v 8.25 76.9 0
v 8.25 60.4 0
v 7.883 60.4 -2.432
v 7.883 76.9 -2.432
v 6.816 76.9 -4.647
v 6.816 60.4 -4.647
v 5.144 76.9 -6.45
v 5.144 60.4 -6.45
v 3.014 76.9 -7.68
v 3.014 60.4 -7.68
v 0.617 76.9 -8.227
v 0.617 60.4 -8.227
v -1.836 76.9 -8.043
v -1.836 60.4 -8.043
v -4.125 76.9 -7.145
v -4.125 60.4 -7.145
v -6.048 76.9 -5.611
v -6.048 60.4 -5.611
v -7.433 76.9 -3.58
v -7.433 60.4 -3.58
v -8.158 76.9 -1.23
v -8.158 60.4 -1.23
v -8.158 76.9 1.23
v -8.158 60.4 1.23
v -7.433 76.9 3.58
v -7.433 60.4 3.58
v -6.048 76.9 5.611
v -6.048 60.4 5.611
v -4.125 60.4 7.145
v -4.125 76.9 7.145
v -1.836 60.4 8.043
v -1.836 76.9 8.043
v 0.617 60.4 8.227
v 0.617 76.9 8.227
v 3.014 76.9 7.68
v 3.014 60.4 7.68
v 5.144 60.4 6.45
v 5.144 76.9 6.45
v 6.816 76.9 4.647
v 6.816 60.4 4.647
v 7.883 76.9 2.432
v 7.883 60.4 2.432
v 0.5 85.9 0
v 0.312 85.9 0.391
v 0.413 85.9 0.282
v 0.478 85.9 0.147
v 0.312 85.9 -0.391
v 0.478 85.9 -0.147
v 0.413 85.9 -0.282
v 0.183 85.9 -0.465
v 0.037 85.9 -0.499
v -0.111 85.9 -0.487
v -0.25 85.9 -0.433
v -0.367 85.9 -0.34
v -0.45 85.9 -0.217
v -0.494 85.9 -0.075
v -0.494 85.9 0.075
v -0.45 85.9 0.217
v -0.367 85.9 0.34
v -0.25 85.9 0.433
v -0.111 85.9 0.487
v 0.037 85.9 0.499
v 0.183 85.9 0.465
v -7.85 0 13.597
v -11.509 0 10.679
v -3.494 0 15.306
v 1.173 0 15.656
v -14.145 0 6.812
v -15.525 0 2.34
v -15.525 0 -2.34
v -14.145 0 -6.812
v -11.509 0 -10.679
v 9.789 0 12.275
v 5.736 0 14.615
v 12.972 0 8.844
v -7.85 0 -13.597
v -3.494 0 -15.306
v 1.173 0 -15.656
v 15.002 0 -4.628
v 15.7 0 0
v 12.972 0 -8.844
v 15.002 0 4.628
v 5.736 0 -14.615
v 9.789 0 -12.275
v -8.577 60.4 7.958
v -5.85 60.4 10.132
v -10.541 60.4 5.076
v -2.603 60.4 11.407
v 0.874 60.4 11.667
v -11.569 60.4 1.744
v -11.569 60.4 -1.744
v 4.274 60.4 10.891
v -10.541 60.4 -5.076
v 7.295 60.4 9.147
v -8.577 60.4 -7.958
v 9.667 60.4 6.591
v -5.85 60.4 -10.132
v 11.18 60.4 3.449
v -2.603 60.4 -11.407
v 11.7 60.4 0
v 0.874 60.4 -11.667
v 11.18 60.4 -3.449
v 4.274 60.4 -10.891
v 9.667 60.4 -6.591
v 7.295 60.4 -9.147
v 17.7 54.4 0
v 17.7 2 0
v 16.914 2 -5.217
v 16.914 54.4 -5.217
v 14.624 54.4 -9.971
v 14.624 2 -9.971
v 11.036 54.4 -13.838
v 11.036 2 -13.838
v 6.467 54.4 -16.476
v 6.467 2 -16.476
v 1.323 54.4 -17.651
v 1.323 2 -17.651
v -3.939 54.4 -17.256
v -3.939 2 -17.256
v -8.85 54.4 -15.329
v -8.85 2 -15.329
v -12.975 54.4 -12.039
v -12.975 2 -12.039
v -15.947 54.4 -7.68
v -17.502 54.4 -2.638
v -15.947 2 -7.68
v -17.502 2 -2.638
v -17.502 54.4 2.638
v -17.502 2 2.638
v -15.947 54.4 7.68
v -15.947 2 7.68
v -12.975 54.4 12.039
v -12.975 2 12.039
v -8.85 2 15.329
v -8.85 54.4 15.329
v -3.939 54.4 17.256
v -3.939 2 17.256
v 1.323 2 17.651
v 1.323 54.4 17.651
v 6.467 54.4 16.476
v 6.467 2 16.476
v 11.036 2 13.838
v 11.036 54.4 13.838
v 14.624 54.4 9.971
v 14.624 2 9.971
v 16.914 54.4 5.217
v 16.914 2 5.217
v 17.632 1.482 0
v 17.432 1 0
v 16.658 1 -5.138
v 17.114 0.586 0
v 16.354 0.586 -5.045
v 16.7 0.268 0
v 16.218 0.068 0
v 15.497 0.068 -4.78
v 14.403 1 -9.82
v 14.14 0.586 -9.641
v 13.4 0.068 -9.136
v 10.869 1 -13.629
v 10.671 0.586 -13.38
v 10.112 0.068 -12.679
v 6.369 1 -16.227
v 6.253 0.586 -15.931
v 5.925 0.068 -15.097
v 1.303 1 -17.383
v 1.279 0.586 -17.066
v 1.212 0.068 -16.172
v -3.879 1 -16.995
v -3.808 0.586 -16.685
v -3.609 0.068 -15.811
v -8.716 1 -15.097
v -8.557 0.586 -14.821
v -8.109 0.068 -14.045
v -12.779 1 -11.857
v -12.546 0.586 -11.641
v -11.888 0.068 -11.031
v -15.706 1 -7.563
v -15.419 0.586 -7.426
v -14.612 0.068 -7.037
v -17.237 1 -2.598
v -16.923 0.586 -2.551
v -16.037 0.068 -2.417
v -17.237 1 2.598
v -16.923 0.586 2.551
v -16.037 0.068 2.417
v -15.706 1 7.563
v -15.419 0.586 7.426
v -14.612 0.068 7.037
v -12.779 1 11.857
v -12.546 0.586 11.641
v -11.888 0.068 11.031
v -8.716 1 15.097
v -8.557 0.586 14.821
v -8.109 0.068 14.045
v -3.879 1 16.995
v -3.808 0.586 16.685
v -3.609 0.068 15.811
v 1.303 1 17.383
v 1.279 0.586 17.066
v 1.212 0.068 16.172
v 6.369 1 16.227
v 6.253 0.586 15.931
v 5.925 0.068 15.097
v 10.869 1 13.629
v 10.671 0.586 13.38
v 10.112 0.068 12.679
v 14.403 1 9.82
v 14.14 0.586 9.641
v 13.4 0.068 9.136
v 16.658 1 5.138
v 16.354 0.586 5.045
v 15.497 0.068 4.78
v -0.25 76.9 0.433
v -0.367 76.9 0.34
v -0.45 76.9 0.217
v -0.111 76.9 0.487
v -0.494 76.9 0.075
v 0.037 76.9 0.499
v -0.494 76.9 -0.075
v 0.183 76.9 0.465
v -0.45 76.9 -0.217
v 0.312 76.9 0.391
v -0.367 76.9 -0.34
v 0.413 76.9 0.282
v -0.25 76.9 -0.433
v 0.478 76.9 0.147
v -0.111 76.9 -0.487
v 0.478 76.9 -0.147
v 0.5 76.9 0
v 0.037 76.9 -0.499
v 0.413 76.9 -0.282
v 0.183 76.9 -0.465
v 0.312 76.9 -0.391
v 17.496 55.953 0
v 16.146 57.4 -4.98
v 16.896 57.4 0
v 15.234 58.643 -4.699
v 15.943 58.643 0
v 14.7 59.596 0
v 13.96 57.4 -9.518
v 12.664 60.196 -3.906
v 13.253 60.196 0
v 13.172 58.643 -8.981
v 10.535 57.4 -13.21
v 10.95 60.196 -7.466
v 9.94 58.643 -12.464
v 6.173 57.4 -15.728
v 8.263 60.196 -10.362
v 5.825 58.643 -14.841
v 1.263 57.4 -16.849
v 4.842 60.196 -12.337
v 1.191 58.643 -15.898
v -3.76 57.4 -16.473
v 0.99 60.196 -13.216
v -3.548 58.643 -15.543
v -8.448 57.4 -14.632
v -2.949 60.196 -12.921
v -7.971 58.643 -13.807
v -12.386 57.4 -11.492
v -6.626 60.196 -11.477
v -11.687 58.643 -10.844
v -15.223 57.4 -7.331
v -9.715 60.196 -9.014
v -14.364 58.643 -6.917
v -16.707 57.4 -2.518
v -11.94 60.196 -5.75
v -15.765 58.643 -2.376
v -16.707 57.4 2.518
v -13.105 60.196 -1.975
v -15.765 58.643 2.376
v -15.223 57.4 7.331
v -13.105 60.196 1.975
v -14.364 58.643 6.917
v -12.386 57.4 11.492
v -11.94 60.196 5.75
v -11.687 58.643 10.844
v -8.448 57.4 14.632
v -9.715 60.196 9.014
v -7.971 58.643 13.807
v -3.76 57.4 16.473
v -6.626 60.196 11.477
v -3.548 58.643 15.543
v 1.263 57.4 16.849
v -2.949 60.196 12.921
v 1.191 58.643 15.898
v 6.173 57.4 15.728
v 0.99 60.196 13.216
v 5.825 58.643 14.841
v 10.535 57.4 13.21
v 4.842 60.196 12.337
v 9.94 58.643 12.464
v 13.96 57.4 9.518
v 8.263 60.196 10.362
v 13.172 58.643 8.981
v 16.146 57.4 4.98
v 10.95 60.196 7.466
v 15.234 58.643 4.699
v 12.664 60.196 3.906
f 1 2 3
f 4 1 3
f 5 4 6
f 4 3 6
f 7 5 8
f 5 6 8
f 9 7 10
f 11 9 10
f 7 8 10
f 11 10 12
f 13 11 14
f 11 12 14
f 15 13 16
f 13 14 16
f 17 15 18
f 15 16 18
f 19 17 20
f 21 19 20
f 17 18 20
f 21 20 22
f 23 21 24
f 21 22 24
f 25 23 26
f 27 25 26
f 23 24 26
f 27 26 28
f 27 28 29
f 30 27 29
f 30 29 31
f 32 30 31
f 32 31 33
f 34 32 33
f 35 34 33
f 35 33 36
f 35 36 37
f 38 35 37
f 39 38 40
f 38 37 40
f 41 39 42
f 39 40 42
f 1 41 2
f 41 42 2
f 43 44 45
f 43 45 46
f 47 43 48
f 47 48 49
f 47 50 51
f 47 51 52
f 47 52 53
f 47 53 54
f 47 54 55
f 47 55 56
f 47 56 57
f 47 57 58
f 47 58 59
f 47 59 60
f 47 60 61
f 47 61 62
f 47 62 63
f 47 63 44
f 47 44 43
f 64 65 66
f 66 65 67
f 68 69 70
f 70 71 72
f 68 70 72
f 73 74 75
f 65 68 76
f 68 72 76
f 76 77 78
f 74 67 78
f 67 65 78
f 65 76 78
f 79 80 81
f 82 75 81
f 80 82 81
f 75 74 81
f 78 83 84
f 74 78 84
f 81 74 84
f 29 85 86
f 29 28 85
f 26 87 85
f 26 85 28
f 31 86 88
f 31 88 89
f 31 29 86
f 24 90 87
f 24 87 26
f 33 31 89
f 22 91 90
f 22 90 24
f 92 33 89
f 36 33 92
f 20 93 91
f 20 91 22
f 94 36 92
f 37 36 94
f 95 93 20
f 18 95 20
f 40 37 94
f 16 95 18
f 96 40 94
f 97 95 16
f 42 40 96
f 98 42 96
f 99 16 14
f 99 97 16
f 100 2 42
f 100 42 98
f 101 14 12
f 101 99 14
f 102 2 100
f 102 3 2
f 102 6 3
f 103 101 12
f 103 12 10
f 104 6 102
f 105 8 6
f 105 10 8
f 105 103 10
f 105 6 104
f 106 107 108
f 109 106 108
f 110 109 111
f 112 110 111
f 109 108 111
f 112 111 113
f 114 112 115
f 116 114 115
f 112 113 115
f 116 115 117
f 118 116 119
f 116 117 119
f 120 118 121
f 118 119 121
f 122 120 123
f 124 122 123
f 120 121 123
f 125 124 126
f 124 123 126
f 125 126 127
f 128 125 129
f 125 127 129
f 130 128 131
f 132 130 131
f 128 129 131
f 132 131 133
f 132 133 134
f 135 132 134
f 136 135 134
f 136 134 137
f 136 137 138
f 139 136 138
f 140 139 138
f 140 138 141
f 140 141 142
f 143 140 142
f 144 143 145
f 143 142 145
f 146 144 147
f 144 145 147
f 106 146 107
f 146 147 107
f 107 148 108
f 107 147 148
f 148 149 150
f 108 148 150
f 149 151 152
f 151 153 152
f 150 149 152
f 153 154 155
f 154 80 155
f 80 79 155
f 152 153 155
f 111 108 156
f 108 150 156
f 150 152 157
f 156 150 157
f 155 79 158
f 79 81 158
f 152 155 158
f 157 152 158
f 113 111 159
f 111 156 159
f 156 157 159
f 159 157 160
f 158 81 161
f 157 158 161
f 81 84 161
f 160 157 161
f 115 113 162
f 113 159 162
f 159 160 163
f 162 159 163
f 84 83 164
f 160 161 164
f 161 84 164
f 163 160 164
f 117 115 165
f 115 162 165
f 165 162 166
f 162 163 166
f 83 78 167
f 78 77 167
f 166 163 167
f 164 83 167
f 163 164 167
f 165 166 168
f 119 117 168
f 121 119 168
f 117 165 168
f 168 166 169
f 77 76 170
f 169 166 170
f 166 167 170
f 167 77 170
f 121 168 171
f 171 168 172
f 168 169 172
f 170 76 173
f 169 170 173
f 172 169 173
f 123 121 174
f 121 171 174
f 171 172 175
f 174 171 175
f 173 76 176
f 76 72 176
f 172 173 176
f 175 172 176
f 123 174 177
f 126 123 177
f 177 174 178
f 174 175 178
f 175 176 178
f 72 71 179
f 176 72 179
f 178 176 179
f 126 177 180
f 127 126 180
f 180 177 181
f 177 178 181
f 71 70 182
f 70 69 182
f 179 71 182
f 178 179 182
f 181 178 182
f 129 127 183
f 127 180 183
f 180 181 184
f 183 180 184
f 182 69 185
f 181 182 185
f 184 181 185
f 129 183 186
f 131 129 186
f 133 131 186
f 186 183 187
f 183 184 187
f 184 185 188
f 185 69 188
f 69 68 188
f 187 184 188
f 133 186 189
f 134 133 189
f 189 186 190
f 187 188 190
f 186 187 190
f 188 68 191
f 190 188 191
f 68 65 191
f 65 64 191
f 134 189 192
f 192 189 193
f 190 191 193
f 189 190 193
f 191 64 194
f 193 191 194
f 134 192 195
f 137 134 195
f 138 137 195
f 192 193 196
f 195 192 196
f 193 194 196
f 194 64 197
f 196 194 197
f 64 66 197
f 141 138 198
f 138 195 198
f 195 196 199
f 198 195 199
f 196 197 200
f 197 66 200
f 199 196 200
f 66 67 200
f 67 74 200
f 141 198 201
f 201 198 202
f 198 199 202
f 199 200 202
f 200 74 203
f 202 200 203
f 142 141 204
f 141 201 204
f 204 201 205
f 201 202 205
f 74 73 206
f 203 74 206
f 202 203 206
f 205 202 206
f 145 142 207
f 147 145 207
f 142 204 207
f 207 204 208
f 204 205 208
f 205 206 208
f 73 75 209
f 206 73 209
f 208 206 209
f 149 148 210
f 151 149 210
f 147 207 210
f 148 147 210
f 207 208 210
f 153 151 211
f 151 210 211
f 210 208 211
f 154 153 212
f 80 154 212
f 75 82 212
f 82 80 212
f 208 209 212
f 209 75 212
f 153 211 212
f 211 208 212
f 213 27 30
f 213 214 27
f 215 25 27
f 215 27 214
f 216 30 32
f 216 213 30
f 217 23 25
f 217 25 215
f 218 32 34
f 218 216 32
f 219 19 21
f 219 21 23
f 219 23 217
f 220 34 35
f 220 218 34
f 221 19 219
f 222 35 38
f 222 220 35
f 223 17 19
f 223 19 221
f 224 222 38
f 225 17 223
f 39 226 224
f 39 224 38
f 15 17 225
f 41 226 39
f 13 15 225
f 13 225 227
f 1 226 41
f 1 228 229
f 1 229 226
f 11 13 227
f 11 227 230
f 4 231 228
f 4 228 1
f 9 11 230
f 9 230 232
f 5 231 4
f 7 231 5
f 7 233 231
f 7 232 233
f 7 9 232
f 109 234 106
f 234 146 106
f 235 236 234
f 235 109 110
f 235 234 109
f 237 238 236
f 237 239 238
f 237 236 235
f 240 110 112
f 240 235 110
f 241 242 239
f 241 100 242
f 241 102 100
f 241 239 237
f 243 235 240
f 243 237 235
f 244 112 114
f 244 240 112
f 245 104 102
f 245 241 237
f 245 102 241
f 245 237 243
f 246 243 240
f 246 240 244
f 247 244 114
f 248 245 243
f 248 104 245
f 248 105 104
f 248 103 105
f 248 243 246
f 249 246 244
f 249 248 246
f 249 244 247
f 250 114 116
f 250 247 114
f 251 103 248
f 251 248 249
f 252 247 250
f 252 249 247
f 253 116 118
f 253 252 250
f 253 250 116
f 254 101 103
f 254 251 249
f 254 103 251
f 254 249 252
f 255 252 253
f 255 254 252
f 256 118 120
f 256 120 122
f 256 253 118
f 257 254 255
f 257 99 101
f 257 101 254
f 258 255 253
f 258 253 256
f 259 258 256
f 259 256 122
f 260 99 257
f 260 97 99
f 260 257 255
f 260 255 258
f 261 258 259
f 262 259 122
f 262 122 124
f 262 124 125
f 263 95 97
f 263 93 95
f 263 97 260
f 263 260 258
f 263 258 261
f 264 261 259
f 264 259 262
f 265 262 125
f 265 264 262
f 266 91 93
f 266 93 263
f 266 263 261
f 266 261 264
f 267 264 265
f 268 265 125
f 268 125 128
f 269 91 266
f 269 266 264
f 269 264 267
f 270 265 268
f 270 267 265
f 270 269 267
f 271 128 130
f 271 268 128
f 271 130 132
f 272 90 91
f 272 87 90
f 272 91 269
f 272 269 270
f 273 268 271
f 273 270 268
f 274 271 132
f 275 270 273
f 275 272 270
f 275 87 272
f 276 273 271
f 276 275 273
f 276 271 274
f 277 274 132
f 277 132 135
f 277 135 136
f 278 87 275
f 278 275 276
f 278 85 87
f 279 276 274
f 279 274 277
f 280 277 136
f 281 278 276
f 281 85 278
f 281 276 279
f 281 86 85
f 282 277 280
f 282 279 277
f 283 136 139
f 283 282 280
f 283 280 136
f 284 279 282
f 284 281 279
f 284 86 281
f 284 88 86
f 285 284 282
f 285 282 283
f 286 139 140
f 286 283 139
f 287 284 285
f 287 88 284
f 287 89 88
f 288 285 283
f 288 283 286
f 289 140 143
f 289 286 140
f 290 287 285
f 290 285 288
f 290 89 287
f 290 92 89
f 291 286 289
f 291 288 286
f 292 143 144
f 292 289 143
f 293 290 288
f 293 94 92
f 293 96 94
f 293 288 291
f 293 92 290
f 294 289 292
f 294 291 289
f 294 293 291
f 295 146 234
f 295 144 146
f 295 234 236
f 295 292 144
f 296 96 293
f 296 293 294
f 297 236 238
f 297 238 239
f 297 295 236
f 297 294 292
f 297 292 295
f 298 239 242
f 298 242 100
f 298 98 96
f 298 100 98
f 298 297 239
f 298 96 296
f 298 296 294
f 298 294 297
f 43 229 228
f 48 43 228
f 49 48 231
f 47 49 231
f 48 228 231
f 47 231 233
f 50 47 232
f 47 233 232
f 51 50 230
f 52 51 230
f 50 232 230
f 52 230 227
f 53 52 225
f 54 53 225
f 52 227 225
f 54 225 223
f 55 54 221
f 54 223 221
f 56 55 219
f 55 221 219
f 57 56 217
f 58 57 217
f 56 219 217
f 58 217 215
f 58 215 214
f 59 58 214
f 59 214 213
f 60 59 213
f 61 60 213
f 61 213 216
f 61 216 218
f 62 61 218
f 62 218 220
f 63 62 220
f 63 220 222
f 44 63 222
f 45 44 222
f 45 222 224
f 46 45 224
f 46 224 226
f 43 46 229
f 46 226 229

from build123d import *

# Parameters (mm, degrees)
CROQUIS1_R              = 17.7
SALIENTE_EXTRUIR1_DEPTH = 60.4
REDONDEO1_R             = 6
REDONDEO2_R             = 2
CROQUIS2_R              = 8.25
SALIENTE_EXTRUIR2_DEPTH = 16.5
CROQUIS3_R              = 0.5
SALIENTE_EXTRUIR3_DEPTH = 9


with BuildPart() as part:
    # Croquis1 → Saliente-Extruir1 (new body)
    with BuildSketch(Plane(origin=(0, 0, 0), x_dir=(1, 0, 0), z_dir=(0, 1, 0))):
        Circle(CROQUIS1_R)
    extrude(amount=SALIENTE_EXTRUIR1_DEPTH)

    # Redondeo1
    redondeo1_edges = [part.edges().sort_by_distance(p)[0] for p in [
        (-17.7, 60.4, 0),
    ]]
    fillet(redondeo1_edges, radius=REDONDEO1_R)

    # Redondeo2
    redondeo2_edges = [part.edges().sort_by_distance(p)[0] for p in [
        (-17.7, 0, 0),
    ]]
    fillet(redondeo2_edges, radius=REDONDEO2_R)

    # Croquis2 → Saliente-Extruir2 (add)
    with BuildSketch(Plane(origin=(0, 60.4, 0), x_dir=(1, 0, 0), z_dir=(0, 1, 0))):
        Circle(CROQUIS2_R)
    extrude(amount=SALIENTE_EXTRUIR2_DEPTH)

    # Croquis3 → Saliente-Extruir3 (add)
    with BuildSketch(Plane(origin=(0, 76.9, 0), x_dir=(1, 0, 0), z_dir=(0, 1, 0))):
        Circle(CROQUIS3_R)
    extrude(amount=SALIENTE_EXTRUIR3_DEPTH)


solid = part.part
